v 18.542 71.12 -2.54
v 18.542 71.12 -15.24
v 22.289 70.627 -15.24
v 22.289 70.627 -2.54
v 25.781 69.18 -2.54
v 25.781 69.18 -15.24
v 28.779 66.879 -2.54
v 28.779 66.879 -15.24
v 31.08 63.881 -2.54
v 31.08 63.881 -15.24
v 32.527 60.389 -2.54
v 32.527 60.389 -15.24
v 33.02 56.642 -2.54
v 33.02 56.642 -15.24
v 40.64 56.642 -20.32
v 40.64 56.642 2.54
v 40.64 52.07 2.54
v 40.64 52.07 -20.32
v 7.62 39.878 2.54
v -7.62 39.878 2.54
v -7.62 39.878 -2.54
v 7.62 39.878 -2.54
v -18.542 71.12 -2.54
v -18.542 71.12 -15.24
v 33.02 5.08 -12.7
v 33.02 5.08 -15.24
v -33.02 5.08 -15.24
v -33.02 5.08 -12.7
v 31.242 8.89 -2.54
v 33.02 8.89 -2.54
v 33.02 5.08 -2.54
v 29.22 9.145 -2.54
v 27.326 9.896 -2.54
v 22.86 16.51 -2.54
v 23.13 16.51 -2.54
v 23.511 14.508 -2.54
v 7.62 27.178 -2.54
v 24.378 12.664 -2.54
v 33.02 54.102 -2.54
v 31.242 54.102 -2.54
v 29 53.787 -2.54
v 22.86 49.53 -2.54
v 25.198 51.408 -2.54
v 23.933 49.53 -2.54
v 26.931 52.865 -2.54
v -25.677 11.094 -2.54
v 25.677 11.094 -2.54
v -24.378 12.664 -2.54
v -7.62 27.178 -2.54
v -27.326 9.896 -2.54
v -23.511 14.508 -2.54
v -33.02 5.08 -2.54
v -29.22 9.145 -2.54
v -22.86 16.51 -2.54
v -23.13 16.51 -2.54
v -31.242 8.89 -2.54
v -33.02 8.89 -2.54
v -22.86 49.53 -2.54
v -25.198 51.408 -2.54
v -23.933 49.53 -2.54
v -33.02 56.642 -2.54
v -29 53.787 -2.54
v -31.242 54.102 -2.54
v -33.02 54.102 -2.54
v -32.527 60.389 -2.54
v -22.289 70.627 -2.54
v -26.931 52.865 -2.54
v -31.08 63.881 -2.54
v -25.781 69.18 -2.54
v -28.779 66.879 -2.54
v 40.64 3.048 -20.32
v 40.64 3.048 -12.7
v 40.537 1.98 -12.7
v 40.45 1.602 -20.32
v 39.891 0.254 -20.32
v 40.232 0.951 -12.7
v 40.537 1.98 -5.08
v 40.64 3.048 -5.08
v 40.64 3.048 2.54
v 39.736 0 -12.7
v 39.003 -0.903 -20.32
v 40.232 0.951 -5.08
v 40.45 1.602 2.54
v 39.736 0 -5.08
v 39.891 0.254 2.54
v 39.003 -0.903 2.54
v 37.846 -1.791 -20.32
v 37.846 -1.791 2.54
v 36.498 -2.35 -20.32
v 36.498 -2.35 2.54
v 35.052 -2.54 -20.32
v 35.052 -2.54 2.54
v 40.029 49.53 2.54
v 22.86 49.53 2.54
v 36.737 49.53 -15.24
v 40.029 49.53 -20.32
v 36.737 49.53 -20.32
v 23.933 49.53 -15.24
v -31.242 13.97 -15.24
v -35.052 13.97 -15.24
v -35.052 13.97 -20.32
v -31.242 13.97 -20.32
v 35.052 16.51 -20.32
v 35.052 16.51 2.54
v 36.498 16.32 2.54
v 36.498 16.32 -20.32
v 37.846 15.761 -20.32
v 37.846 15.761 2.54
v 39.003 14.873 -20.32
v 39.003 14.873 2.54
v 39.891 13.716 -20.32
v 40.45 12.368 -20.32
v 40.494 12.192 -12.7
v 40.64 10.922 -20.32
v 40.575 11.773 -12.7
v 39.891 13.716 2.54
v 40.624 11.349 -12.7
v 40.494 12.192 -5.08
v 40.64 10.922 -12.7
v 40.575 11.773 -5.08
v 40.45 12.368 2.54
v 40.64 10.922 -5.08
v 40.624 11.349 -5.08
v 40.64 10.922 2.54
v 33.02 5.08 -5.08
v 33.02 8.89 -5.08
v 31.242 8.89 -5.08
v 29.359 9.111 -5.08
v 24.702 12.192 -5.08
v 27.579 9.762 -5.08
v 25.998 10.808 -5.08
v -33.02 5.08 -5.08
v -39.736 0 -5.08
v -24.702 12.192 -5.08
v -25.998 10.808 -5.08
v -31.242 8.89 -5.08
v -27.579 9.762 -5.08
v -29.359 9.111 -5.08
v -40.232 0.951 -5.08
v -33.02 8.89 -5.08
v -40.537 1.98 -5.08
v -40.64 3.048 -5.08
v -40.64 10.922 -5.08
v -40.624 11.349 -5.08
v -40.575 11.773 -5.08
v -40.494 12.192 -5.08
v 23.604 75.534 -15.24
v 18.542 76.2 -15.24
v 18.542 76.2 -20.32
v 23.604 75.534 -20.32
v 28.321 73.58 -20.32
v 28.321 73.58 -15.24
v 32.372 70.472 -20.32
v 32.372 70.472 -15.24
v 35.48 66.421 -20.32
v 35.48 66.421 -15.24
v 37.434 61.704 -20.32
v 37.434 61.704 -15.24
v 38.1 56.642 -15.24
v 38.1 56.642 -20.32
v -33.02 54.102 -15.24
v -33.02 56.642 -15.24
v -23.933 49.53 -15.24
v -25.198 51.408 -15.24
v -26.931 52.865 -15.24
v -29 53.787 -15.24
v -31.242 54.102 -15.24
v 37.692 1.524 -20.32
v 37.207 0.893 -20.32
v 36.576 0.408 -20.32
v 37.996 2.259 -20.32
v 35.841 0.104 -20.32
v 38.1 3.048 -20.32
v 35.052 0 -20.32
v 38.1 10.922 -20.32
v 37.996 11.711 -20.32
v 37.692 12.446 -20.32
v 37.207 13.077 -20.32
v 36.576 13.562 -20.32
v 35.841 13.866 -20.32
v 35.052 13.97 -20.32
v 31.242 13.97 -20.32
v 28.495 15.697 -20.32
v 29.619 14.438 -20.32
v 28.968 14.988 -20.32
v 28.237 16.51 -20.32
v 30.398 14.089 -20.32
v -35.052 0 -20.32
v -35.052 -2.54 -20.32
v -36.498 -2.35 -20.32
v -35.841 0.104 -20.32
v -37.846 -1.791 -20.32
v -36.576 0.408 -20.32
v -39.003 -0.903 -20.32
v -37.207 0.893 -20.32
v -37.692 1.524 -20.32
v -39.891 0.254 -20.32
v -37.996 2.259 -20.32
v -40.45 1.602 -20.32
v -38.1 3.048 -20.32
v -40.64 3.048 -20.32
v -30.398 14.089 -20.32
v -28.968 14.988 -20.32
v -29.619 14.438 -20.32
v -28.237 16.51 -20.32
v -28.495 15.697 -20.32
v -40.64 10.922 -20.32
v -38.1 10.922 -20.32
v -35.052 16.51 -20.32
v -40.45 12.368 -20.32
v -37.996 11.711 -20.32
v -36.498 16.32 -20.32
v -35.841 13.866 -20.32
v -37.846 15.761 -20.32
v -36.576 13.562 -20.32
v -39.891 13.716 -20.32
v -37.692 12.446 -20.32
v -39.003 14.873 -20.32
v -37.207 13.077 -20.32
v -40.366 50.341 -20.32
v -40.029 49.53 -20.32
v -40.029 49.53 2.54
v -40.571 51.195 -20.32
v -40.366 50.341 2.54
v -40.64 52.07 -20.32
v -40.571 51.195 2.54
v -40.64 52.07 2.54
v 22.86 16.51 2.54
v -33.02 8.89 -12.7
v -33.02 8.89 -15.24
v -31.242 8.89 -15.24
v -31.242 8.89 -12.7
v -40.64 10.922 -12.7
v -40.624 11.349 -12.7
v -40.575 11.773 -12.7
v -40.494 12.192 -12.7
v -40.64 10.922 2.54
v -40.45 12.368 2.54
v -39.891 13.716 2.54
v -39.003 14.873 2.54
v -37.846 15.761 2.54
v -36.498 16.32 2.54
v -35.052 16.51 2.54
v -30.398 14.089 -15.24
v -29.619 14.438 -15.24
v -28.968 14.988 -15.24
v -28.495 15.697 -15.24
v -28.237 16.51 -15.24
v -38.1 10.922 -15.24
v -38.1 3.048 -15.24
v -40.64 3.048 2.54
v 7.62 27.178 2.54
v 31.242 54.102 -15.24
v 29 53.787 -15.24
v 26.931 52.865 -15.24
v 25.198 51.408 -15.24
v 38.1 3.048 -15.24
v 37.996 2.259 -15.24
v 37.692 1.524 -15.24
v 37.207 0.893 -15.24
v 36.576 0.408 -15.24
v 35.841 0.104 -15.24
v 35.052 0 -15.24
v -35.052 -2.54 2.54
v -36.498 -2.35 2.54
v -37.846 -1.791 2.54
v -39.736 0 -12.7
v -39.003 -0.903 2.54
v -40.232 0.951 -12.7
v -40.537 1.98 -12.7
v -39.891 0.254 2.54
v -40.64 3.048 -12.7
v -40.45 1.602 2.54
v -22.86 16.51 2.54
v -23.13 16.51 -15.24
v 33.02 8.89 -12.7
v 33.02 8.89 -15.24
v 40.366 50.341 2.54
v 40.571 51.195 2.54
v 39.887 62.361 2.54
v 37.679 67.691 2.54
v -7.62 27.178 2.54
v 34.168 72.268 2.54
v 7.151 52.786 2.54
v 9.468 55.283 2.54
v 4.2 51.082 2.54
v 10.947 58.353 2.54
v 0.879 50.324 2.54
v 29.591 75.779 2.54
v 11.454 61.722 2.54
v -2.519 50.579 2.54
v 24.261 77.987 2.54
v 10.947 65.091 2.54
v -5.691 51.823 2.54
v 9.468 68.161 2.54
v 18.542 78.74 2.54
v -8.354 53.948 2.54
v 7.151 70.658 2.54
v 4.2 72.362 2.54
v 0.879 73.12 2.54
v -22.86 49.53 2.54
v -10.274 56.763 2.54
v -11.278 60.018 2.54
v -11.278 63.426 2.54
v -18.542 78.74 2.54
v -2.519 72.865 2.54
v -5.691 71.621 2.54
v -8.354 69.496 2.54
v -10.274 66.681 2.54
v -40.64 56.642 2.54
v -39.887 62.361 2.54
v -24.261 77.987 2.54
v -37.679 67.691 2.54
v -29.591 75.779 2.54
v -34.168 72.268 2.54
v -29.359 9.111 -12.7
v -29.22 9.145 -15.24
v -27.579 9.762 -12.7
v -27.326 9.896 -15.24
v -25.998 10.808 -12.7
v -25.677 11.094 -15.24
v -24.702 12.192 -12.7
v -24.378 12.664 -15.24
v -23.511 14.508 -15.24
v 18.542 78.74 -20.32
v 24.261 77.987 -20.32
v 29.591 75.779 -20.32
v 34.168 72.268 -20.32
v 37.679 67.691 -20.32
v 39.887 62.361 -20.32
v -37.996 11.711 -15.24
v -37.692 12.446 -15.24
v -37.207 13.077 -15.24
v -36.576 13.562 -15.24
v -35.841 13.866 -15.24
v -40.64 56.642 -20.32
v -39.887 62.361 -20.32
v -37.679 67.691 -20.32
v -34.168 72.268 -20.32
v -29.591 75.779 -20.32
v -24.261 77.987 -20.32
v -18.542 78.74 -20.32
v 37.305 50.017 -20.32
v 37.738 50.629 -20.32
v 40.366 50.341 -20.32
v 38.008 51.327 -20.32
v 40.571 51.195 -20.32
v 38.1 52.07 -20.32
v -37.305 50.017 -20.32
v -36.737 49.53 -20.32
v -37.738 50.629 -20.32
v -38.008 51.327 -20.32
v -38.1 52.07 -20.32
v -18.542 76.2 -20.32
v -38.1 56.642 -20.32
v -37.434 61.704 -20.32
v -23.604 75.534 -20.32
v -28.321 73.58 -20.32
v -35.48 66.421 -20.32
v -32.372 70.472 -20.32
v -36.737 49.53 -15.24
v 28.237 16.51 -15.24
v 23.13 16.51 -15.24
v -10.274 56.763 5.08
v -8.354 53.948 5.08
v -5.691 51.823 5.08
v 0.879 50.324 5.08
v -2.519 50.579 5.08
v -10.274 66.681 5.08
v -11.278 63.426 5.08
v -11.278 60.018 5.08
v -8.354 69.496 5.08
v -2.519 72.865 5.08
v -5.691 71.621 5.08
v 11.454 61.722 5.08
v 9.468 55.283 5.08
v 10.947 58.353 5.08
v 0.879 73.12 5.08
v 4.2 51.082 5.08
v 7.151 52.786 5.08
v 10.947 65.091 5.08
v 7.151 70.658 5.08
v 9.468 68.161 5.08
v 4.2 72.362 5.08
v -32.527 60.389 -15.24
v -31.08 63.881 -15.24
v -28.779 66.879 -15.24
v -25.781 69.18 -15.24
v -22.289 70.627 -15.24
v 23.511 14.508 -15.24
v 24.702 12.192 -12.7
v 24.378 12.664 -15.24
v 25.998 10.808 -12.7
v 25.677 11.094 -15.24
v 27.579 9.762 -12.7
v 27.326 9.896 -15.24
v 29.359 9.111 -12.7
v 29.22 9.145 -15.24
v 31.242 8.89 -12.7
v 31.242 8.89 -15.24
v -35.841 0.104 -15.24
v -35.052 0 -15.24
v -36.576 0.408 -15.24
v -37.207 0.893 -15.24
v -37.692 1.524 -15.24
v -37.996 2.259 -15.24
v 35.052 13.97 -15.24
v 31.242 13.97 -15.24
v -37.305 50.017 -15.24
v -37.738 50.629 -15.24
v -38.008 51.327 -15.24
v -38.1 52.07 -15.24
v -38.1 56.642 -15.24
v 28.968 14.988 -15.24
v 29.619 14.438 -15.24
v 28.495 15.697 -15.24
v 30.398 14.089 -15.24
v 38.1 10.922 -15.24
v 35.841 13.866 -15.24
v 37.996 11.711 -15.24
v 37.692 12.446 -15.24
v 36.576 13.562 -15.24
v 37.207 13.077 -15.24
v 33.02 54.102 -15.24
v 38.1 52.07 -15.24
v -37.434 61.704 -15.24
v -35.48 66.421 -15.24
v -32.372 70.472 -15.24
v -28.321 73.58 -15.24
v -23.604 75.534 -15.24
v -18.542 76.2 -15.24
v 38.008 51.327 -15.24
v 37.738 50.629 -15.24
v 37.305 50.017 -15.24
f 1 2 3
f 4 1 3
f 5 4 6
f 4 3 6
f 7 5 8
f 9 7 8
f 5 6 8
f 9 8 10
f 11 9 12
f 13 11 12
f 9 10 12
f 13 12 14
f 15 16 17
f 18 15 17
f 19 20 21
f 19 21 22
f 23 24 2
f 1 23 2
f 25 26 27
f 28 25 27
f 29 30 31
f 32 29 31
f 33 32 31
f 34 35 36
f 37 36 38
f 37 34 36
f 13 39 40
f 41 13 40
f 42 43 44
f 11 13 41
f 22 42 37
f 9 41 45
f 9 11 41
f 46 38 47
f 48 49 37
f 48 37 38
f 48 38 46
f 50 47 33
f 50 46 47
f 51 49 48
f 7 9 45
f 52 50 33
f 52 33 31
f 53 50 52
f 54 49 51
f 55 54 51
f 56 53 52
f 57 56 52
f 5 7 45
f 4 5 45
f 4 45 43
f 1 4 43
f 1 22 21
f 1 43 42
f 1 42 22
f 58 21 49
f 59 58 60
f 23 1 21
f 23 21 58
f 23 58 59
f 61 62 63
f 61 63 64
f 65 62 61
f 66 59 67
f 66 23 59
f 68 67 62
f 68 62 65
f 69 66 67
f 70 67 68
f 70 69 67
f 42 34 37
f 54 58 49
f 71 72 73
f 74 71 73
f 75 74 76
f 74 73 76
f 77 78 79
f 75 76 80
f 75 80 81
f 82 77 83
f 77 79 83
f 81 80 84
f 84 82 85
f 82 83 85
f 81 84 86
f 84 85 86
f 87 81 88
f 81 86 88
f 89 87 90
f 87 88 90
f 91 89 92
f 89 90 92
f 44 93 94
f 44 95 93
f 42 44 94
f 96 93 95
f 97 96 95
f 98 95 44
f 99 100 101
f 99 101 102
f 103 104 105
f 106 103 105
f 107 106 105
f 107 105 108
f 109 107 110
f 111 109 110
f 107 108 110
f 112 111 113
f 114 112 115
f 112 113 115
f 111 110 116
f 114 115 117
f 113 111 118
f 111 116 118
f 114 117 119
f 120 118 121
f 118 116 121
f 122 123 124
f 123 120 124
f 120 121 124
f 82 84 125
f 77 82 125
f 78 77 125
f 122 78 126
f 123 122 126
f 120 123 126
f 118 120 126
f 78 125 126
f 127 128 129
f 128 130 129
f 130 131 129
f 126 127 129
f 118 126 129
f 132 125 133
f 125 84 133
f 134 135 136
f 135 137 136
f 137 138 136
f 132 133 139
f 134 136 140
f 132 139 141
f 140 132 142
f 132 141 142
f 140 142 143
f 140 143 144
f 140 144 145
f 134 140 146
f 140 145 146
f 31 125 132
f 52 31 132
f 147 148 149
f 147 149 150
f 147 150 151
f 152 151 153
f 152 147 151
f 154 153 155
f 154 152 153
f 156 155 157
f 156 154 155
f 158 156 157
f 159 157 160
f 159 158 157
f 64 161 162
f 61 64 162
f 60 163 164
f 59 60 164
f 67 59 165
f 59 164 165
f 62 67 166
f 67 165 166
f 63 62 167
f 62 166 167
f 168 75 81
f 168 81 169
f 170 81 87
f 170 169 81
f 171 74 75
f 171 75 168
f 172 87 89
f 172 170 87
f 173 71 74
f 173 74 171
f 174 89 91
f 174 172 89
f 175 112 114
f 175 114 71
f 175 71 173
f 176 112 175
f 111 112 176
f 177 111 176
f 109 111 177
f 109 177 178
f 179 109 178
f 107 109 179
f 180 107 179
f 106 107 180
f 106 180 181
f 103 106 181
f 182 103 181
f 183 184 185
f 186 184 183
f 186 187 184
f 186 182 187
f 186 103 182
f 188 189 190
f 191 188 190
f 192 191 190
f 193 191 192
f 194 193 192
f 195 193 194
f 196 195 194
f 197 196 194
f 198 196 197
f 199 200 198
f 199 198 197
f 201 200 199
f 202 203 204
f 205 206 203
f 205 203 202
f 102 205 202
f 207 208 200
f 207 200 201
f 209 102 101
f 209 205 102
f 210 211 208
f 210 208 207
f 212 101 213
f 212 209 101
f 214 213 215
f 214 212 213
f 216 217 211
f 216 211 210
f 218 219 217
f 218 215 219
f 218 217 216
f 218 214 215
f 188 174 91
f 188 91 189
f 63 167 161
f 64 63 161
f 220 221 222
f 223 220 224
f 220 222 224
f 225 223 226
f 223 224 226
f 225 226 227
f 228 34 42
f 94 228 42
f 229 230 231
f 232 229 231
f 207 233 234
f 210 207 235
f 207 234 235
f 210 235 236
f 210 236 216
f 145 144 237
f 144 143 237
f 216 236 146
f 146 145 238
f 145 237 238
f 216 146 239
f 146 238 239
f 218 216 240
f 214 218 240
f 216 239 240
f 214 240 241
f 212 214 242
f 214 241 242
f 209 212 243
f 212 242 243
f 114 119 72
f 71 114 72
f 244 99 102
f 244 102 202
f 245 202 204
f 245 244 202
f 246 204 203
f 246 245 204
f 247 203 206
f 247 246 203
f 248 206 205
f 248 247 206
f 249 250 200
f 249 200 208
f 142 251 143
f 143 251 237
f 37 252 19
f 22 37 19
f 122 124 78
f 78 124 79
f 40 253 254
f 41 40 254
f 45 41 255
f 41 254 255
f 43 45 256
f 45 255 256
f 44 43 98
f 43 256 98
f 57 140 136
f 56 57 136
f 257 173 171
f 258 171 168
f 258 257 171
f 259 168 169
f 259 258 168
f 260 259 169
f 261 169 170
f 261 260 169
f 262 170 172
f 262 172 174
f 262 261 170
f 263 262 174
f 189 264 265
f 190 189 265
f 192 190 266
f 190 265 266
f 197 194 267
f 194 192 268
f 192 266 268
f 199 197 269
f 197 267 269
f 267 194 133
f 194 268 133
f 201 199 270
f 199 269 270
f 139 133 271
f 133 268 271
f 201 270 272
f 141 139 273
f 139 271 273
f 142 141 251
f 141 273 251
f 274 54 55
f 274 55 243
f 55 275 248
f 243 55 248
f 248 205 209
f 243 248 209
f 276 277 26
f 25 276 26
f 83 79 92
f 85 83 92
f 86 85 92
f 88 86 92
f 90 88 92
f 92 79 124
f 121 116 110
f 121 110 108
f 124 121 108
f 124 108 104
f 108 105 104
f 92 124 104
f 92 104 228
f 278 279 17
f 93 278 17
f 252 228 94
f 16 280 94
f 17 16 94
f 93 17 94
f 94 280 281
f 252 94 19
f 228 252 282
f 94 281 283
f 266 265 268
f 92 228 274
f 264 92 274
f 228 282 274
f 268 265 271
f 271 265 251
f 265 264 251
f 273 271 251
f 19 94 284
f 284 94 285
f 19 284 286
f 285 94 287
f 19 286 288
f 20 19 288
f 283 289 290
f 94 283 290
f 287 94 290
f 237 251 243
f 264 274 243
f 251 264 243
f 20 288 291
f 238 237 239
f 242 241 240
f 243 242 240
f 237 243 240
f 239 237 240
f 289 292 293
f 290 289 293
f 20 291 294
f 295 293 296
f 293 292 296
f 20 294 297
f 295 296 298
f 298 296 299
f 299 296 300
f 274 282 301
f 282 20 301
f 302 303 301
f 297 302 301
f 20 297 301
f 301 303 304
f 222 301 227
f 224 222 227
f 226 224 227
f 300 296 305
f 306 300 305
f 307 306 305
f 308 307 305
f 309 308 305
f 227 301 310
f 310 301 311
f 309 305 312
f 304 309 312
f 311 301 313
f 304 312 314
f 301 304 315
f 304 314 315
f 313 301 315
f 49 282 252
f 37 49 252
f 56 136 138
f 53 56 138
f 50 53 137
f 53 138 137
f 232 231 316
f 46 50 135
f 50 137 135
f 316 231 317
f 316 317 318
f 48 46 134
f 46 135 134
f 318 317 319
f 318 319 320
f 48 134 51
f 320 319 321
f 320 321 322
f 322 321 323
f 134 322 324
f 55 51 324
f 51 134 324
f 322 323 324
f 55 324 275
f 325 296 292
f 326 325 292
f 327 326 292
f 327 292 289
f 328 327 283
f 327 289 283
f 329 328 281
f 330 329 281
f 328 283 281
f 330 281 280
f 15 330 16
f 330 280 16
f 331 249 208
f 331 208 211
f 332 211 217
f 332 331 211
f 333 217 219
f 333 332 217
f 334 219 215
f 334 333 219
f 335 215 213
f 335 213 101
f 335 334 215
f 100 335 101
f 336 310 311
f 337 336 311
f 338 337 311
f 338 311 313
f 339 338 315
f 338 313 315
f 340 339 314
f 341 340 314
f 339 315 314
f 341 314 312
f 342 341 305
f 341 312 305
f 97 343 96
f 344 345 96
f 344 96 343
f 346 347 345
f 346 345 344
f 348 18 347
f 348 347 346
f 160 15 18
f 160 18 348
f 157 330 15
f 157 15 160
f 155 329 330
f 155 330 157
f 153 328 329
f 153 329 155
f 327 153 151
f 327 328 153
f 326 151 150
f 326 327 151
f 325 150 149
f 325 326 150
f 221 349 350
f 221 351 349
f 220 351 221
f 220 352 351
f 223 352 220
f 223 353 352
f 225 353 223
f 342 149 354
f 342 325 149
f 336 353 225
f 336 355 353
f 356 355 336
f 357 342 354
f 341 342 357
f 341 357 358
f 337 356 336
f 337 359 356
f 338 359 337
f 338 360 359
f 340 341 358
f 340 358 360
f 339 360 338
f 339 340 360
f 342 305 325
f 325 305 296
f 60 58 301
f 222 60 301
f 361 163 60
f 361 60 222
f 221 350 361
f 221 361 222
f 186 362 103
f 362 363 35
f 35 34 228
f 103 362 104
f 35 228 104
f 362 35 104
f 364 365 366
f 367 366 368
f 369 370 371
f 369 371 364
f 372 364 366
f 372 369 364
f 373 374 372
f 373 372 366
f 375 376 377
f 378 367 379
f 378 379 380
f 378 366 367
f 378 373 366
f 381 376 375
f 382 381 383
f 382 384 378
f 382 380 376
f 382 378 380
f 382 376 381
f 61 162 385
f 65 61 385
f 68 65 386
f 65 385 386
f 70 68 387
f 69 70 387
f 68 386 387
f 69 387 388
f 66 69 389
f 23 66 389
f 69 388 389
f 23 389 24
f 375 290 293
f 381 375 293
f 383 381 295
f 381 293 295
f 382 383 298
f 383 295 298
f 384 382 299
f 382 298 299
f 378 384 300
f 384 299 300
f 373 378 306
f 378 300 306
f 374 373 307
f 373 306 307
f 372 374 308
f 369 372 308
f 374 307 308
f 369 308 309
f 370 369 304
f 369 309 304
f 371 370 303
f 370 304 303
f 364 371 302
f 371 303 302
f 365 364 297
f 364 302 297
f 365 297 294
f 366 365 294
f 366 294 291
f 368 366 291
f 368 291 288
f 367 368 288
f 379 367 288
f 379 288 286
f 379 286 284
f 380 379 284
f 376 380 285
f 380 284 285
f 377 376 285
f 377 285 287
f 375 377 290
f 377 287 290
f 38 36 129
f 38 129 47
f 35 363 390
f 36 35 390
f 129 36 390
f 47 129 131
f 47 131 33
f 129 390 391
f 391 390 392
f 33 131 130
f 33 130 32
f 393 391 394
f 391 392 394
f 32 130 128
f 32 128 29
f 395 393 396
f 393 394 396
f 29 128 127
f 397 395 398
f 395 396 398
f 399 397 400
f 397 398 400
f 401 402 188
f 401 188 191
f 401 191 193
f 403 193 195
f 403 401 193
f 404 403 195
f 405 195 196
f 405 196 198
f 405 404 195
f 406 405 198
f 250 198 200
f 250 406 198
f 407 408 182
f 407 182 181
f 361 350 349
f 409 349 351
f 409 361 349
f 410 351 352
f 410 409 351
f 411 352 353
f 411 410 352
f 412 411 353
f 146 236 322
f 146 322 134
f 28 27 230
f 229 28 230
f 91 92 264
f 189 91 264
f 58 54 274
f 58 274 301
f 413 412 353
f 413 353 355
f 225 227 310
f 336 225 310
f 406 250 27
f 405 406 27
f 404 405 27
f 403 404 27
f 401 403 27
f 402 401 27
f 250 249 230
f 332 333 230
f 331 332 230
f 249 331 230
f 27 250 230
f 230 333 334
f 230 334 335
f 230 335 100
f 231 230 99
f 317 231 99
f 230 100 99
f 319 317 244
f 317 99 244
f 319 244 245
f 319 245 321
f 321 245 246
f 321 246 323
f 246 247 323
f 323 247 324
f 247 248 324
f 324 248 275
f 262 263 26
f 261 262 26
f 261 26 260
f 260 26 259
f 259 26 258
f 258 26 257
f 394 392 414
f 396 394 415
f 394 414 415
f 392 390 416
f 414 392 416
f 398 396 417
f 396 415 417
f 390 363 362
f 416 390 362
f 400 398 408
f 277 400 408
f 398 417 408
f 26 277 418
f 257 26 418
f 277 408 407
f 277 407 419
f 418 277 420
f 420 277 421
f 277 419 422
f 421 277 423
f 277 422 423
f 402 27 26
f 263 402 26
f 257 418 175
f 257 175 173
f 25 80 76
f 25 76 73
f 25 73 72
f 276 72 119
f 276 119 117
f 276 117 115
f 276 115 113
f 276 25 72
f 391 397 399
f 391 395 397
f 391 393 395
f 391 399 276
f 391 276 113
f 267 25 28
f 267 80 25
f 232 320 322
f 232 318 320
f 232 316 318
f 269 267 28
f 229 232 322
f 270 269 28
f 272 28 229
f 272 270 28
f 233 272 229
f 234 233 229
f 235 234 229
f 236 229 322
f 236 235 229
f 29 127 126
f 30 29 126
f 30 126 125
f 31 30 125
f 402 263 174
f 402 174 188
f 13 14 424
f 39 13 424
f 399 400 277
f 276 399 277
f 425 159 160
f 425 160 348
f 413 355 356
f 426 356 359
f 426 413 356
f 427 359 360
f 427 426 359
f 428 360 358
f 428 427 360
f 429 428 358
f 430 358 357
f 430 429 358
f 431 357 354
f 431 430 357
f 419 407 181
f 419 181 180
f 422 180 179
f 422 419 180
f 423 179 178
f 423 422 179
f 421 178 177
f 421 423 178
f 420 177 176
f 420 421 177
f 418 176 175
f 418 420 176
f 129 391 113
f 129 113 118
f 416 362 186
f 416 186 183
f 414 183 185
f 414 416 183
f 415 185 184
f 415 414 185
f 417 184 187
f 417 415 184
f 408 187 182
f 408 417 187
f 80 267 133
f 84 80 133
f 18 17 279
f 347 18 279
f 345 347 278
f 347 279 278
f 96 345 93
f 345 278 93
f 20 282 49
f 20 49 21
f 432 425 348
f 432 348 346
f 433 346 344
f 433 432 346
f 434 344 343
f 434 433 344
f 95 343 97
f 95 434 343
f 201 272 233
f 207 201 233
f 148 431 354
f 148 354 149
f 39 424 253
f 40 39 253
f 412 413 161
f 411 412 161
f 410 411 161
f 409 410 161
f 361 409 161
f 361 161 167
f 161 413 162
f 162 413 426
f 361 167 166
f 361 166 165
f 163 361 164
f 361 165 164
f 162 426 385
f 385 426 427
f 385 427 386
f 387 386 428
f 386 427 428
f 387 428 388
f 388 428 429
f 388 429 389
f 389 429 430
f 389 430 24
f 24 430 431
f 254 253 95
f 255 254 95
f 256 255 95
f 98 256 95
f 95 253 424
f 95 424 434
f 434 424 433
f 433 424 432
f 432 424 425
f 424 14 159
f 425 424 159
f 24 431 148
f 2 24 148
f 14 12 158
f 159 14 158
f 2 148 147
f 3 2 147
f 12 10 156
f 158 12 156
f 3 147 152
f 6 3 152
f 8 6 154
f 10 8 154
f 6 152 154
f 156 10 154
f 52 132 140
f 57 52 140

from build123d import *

# Parameters (mm, degrees)
BOSS_EXTRUDE1_DEPTH      = 17.78
CUT_EXTRUDE1_DEPTH       = 12.7
BOSS_EXTRUDE2_DEPTH      = 5.08
BOSS_EXTRUDE2_DEPTH_BACK = 17.78
CUT_EXTRUDE2_REACH       = 93.511
SKETCH8_W                = 23.622
SKETCH8_H                = 33.02
CUT_EXTRUDE3_REACH       = 116.975
SKETCH9_W                = 7.62
SKETCH9_H                = 12.192
SKETCH10_W               = 15.24
SKETCH10_H               = 12.7
CUT_EXTRUDE4_DEPTH       = 5.08
SKETCH11_R               = 11.43
BOSS_EXTRUDE3_DEPTH      = 2.54


with BuildPart() as part:
    # Sketch1 → Boss-Extrude1 (new body)
    with BuildSketch(Plane.XY.offset(2.54)):
        with BuildLine():
            Line((-35.052, 0), (35.052, 0))
            ThreePointArc((35.052, 0), (37.207261469, 0.892738531), (38.1, 3.048))
            Line((38.1, 3.048), (38.1, 10.922))
            ThreePointArc((38.1, 10.922), (37.207261469, 13.077261469), (35.052, 13.97))
            Line((35.052, 13.97), (31.242, 13.97))
            ThreePointArc((31.242, 13.97), (29.086738531, 14.862738531), (28.194, 17.018))
            Line((28.194, 17.018), (28.194, 45.974))
            ThreePointArc((28.194, 45.974), (29.086738531, 48.129261469), (31.242, 49.022))
            Line((31.242, 49.022), (35.052, 49.022))
            ThreePointArc((35.052, 49.022), (37.207261469, 49.914738531), (38.1, 52.07))
            Line((38.1, 52.07), (38.1, 56.642))
            ThreePointArc((38.1, 56.642), (32.371594426, 70.471594426), (18.542, 76.2))
            Line((18.542, 76.2), (-18.542, 76.2))
            ThreePointArc((-18.542, 76.2), (-32.371594426, 70.471594426), (-38.1, 56.642))
            Line((-38.1, 56.642), (-38.1, 52.07))
            ThreePointArc((-38.1, 52.07), (-37.207261469, 49.914738531), (-35.052, 49.022))
            Line((-35.052, 49.022), (-31.242, 49.022))
            ThreePointArc((-31.242, 49.022), (-29.086738531, 48.129261469), (-28.194, 45.974))
            Line((-28.194, 45.974), (-28.194, 17.018))
            ThreePointArc((-28.194, 17.018), (-29.086738531, 14.862738531), (-31.242, 13.97))
            Line((-31.242, 13.97), (-35.052, 13.97))
            ThreePointArc((-35.052, 13.97), (-37.207261469, 13.077261469), (-38.1, 10.922))
            Line((-38.1, 10.922), (-38.1, 3.048))
            ThreePointArc((-38.1, 3.048), (-37.207261469, 0.892738531), (-35.052, 0))
        make_face()
    extrude(amount=-BOSS_EXTRUDE1_DEPTH)

    # Sketch2 → Cut-Extrude1 (cut)
    with BuildSketch(Plane(origin=(0, 0, -15.24), x_dir=(-1, 0, 0), z_dir=(0, 0, -1))):
        with BuildLine():
            Line((33.02, 54.102), (33.02, 56.642))
            ThreePointArc((33.02, 56.642), (28.779491978, 66.879491978), (18.542, 71.12))
            Line((18.542, 71.12), (-18.542, 71.12))
            ThreePointArc((-18.542, 71.12), (-28.779491978, 66.879491978), (-33.02, 56.642))
            Line((-33.02, 56.642), (-33.02, 54.102))
            Line((-33.02, 54.102), (-31.242, 54.102))
            ThreePointArc((-31.242, 54.102), (-25.494636083, 51.721363917), (-23.114, 45.974))
            Line((-23.114, 45.974), (-23.114, 17.018))
            ThreePointArc((-23.114, 17.018), (-25.494636083, 11.270636083), (-31.242, 8.89))
            Line((-31.242, 8.89), (-33.02, 8.89))
            Line((-33.02, 8.89), (-33.02, 5.08))
            Line((-33.02, 5.08), (33.02, 5.08))
            Line((33.02, 5.08), (33.02, 8.89))
            Line((33.02, 8.89), (31.242, 8.89))
            ThreePointArc((31.242, 8.89), (25.494636083, 11.270636083), (23.114, 17.018))
            Line((23.114, 17.018), (23.114, 45.974))
            ThreePointArc((23.114, 45.974), (25.494636083, 51.721363917), (31.242, 54.102))
            Line((31.242, 54.102), (33.02, 54.102))
        make_face()
    extrude(amount=-CUT_EXTRUDE1_DEPTH, mode=Mode.SUBTRACT)

    # Sketch7 → Boss-Extrude2 (add, two sides: drawn at the far end of the back side and taken through both)
    with BuildSketch(Plane(origin=(0, 0, -15.24), x_dir=(-1, 0, 0), z_dir=(0, 0, -1)).offset(-BOSS_EXTRUDE2_DEPTH_BACK)):
        with BuildLine():
            Line((18.542, 78.74), (-18.542, 78.74))
            ThreePointArc((-18.542, 78.74), (-34.167645651, 72.267645651), (-40.64, 56.642))
            Line((-40.64, 56.642), (-40.64, 52.07))
            ThreePointArc((-40.64, 52.07), (-39.003312693, 48.118687307), (-35.052, 46.482))
            Line((-35.052, 46.482), (-31.242, 46.482))
            ThreePointArc((-31.242, 46.482), (-30.882789755, 46.333210245), (-30.734, 45.974))
            Line((-30.734, 45.974), (-30.734, 17.018))
            ThreePointArc((-30.734, 17.018), (-30.882789755, 16.658789755), (-31.242, 16.51))
            Line((-31.242, 16.51), (-35.052, 16.51))
            ThreePointArc((-35.052, 16.51), (-39.003312693, 14.873312693), (-40.64, 10.922))
            Line((-40.64, 10.922), (-40.64, 3.048))
            ThreePointArc((-40.64, 3.048), (-39.003312693, -0.903312693), (-35.052, -2.54))
            Line((-35.052, -2.54), (35.052, -2.54))
            ThreePointArc((35.052, -2.54), (39.003312693, -0.903312693), (40.64, 3.048))
            Line((40.64, 3.048), (40.64, 10.922))
            ThreePointArc((40.64, 10.922), (39.003312693, 14.873312693), (35.052, 16.51))
            Line((35.052, 16.51), (31.242, 16.51))
            ThreePointArc((31.242, 16.51), (30.882789755, 16.658789755), (30.734, 17.018))
            Line((30.734, 17.018), (30.734, 45.974))
            ThreePointArc((30.734, 45.974), (30.882789755, 46.333210245), (31.242, 46.482))
            Line((31.242, 46.482), (35.052, 46.482))
            ThreePointArc((35.052, 46.482), (39.003312693, 48.118687307), (40.64, 52.07))
            Line((40.64, 52.07), (40.64, 56.642))
            ThreePointArc((40.64, 56.642), (34.167645651, 72.267645651), (18.542, 78.74))
        make_face()
        with BuildLine():
            ThreePointArc((-38.1, 52.07), (-37.207261469, 49.914738531), (-35.052, 49.022))
            Line((-35.052, 49.022), (-31.242, 49.022))
            ThreePointArc((-31.242, 49.022), (-29.086738531, 48.129261469), (-28.194, 45.974))
            Line((-28.194, 45.974), (-28.194, 17.018))
            ThreePointArc((-28.194, 17.018), (-29.086738531, 14.862738531), (-31.242, 13.97))
            Line((-31.242, 13.97), (-35.052, 13.97))
            ThreePointArc((-35.052, 13.97), (-37.207261469, 13.077261469), (-38.1, 10.922))
            Line((-38.1, 10.922), (-38.1, 3.048))
            ThreePointArc((-38.1, 3.048), (-37.207261469, 0.892738531), (-35.052, 0))
            Line((-35.052, 0), (35.052, 0))
            ThreePointArc((35.052, 0), (37.207261469, 0.892738531), (38.1, 3.048))
            Line((38.1, 3.048), (38.1, 10.922))
            ThreePointArc((38.1, 10.922), (37.207261469, 13.077261469), (35.052, 13.97))
            Line((35.052, 13.97), (31.242, 13.97))
            ThreePointArc((31.242, 13.97), (29.086738531, 14.862738531), (28.194, 17.018))
            Line((28.194, 17.018), (28.194, 45.974))
            ThreePointArc((28.194, 45.974), (29.086738531, 48.129261469), (31.242, 49.022))
            Line((31.242, 49.022), (35.052, 49.022))
            ThreePointArc((35.052, 49.022), (37.207261469, 49.914738531), (38.1, 52.07))
            Line((38.1, 52.07), (38.1, 56.642))
            ThreePointArc((38.1, 56.642), (32.371594426, 70.471594426), (18.542, 76.2))
            Line((18.542, 76.2), (-18.542, 76.2))
            ThreePointArc((-18.542, 76.2), (-32.371594426, 70.471594426), (-38.1, 56.642))
            Line((-38.1, 56.642), (-38.1, 52.07))
        make_face(mode=Mode.SUBTRACT)
    extrude(amount=BOSS_EXTRUDE2_DEPTH + BOSS_EXTRUDE2_DEPTH_BACK)

    # Cut-Extrude2: up to this face of the body (flat: up to its plane)
    cut_extrude2_end = Plane(part.part.faces().sort_by_distance((0, 37.604047464, 2.54))[0])
    # Sketch8 → Cut-Extrude2 (cut, up to the picked face)
    with BuildSketch(Plane(origin=(0, 0, -20.32), x_dir=(-1, 0, 0), z_dir=(0, 0, -1)), mode=Mode.PRIVATE) as cut_extrude2_sk1:
        with Locations((-34.671, 33.02)):
            Rectangle(SKETCH8_W, SKETCH8_H)
    cut_extrude2_tool1 = split(extrude(cut_extrude2_sk1.sketch, amount=-CUT_EXTRUDE2_REACH, mode=Mode.PRIVATE), bisect_by=cut_extrude2_end, keep=Keep.BOTH, mode=Mode.PRIVATE)
    # Sketch8 → Cut-Extrude2 (cut, up to the picked face)
    with BuildSketch(Plane(origin=(0, 0, -20.32), x_dir=(-1, 0, 0), z_dir=(0, 0, -1)), mode=Mode.PRIVATE) as cut_extrude2_sk2:
        with Locations((34.671, 33.02)):
            Rectangle(SKETCH8_W, SKETCH8_H)
    cut_extrude2_tool2 = split(extrude(cut_extrude2_sk2.sketch, amount=-CUT_EXTRUDE2_REACH, mode=Mode.PRIVATE), bisect_by=cut_extrude2_end, keep=Keep.BOTH, mode=Mode.PRIVATE)
    add(cut_extrude2_tool1.solids().sort_by(Axis((34.671, 33.02, -20.32), (0, 0, 1)))[0], mode=Mode.SUBTRACT)
    add(cut_extrude2_tool2.solids().sort_by(Axis((-34.671, 33.02, -20.32), (0, 0, 1)))[0], mode=Mode.SUBTRACT)

    # Cut-Extrude3: up to this face of the body (flat: up to its plane)
    cut_extrude3_end = Plane(part.part.faces().sort_by_distance((40.64, 6.985, -8.89))[0])
    # Sketch9 → Cut-Extrude3 (cut, up to the picked face)
    with BuildSketch(Plane.ZY.offset(40.64), mode=Mode.PRIVATE) as cut_extrude3_sk1:
        with Locations((-8.89, 6.096)):
            Rectangle(SKETCH9_W, SKETCH9_H)
    cut_extrude3_tool1 = split(extrude(cut_extrude3_sk1.sketch, amount=-CUT_EXTRUDE3_REACH, mode=Mode.PRIVATE), bisect_by=cut_extrude3_end, keep=Keep.BOTH, mode=Mode.PRIVATE)
    add(cut_extrude3_tool1.solids().sort_by(Axis((-40.64, 6.096, -8.89), (1, 0, 0)))[0], mode=Mode.SUBTRACT)

    # Sketch10 → Cut-Extrude4 (cut)
    with BuildSketch(Plane.XY.offset(2.54)):
        with Locations((0, 33.528)):
            Rectangle(SKETCH10_W, SKETCH10_H)
    extrude(amount=-CUT_EXTRUDE4_DEPTH, mode=Mode.SUBTRACT)

    # Sketch11 → Boss-Extrude3 (add)
    with BuildSketch(Plane.XY.offset(2.54)):
        with Locations((0.024363157, 61.722)):
            Circle(SKETCH11_R)
    extrude(amount=BOSS_EXTRUDE3_DEPTH)


solid = part.part
